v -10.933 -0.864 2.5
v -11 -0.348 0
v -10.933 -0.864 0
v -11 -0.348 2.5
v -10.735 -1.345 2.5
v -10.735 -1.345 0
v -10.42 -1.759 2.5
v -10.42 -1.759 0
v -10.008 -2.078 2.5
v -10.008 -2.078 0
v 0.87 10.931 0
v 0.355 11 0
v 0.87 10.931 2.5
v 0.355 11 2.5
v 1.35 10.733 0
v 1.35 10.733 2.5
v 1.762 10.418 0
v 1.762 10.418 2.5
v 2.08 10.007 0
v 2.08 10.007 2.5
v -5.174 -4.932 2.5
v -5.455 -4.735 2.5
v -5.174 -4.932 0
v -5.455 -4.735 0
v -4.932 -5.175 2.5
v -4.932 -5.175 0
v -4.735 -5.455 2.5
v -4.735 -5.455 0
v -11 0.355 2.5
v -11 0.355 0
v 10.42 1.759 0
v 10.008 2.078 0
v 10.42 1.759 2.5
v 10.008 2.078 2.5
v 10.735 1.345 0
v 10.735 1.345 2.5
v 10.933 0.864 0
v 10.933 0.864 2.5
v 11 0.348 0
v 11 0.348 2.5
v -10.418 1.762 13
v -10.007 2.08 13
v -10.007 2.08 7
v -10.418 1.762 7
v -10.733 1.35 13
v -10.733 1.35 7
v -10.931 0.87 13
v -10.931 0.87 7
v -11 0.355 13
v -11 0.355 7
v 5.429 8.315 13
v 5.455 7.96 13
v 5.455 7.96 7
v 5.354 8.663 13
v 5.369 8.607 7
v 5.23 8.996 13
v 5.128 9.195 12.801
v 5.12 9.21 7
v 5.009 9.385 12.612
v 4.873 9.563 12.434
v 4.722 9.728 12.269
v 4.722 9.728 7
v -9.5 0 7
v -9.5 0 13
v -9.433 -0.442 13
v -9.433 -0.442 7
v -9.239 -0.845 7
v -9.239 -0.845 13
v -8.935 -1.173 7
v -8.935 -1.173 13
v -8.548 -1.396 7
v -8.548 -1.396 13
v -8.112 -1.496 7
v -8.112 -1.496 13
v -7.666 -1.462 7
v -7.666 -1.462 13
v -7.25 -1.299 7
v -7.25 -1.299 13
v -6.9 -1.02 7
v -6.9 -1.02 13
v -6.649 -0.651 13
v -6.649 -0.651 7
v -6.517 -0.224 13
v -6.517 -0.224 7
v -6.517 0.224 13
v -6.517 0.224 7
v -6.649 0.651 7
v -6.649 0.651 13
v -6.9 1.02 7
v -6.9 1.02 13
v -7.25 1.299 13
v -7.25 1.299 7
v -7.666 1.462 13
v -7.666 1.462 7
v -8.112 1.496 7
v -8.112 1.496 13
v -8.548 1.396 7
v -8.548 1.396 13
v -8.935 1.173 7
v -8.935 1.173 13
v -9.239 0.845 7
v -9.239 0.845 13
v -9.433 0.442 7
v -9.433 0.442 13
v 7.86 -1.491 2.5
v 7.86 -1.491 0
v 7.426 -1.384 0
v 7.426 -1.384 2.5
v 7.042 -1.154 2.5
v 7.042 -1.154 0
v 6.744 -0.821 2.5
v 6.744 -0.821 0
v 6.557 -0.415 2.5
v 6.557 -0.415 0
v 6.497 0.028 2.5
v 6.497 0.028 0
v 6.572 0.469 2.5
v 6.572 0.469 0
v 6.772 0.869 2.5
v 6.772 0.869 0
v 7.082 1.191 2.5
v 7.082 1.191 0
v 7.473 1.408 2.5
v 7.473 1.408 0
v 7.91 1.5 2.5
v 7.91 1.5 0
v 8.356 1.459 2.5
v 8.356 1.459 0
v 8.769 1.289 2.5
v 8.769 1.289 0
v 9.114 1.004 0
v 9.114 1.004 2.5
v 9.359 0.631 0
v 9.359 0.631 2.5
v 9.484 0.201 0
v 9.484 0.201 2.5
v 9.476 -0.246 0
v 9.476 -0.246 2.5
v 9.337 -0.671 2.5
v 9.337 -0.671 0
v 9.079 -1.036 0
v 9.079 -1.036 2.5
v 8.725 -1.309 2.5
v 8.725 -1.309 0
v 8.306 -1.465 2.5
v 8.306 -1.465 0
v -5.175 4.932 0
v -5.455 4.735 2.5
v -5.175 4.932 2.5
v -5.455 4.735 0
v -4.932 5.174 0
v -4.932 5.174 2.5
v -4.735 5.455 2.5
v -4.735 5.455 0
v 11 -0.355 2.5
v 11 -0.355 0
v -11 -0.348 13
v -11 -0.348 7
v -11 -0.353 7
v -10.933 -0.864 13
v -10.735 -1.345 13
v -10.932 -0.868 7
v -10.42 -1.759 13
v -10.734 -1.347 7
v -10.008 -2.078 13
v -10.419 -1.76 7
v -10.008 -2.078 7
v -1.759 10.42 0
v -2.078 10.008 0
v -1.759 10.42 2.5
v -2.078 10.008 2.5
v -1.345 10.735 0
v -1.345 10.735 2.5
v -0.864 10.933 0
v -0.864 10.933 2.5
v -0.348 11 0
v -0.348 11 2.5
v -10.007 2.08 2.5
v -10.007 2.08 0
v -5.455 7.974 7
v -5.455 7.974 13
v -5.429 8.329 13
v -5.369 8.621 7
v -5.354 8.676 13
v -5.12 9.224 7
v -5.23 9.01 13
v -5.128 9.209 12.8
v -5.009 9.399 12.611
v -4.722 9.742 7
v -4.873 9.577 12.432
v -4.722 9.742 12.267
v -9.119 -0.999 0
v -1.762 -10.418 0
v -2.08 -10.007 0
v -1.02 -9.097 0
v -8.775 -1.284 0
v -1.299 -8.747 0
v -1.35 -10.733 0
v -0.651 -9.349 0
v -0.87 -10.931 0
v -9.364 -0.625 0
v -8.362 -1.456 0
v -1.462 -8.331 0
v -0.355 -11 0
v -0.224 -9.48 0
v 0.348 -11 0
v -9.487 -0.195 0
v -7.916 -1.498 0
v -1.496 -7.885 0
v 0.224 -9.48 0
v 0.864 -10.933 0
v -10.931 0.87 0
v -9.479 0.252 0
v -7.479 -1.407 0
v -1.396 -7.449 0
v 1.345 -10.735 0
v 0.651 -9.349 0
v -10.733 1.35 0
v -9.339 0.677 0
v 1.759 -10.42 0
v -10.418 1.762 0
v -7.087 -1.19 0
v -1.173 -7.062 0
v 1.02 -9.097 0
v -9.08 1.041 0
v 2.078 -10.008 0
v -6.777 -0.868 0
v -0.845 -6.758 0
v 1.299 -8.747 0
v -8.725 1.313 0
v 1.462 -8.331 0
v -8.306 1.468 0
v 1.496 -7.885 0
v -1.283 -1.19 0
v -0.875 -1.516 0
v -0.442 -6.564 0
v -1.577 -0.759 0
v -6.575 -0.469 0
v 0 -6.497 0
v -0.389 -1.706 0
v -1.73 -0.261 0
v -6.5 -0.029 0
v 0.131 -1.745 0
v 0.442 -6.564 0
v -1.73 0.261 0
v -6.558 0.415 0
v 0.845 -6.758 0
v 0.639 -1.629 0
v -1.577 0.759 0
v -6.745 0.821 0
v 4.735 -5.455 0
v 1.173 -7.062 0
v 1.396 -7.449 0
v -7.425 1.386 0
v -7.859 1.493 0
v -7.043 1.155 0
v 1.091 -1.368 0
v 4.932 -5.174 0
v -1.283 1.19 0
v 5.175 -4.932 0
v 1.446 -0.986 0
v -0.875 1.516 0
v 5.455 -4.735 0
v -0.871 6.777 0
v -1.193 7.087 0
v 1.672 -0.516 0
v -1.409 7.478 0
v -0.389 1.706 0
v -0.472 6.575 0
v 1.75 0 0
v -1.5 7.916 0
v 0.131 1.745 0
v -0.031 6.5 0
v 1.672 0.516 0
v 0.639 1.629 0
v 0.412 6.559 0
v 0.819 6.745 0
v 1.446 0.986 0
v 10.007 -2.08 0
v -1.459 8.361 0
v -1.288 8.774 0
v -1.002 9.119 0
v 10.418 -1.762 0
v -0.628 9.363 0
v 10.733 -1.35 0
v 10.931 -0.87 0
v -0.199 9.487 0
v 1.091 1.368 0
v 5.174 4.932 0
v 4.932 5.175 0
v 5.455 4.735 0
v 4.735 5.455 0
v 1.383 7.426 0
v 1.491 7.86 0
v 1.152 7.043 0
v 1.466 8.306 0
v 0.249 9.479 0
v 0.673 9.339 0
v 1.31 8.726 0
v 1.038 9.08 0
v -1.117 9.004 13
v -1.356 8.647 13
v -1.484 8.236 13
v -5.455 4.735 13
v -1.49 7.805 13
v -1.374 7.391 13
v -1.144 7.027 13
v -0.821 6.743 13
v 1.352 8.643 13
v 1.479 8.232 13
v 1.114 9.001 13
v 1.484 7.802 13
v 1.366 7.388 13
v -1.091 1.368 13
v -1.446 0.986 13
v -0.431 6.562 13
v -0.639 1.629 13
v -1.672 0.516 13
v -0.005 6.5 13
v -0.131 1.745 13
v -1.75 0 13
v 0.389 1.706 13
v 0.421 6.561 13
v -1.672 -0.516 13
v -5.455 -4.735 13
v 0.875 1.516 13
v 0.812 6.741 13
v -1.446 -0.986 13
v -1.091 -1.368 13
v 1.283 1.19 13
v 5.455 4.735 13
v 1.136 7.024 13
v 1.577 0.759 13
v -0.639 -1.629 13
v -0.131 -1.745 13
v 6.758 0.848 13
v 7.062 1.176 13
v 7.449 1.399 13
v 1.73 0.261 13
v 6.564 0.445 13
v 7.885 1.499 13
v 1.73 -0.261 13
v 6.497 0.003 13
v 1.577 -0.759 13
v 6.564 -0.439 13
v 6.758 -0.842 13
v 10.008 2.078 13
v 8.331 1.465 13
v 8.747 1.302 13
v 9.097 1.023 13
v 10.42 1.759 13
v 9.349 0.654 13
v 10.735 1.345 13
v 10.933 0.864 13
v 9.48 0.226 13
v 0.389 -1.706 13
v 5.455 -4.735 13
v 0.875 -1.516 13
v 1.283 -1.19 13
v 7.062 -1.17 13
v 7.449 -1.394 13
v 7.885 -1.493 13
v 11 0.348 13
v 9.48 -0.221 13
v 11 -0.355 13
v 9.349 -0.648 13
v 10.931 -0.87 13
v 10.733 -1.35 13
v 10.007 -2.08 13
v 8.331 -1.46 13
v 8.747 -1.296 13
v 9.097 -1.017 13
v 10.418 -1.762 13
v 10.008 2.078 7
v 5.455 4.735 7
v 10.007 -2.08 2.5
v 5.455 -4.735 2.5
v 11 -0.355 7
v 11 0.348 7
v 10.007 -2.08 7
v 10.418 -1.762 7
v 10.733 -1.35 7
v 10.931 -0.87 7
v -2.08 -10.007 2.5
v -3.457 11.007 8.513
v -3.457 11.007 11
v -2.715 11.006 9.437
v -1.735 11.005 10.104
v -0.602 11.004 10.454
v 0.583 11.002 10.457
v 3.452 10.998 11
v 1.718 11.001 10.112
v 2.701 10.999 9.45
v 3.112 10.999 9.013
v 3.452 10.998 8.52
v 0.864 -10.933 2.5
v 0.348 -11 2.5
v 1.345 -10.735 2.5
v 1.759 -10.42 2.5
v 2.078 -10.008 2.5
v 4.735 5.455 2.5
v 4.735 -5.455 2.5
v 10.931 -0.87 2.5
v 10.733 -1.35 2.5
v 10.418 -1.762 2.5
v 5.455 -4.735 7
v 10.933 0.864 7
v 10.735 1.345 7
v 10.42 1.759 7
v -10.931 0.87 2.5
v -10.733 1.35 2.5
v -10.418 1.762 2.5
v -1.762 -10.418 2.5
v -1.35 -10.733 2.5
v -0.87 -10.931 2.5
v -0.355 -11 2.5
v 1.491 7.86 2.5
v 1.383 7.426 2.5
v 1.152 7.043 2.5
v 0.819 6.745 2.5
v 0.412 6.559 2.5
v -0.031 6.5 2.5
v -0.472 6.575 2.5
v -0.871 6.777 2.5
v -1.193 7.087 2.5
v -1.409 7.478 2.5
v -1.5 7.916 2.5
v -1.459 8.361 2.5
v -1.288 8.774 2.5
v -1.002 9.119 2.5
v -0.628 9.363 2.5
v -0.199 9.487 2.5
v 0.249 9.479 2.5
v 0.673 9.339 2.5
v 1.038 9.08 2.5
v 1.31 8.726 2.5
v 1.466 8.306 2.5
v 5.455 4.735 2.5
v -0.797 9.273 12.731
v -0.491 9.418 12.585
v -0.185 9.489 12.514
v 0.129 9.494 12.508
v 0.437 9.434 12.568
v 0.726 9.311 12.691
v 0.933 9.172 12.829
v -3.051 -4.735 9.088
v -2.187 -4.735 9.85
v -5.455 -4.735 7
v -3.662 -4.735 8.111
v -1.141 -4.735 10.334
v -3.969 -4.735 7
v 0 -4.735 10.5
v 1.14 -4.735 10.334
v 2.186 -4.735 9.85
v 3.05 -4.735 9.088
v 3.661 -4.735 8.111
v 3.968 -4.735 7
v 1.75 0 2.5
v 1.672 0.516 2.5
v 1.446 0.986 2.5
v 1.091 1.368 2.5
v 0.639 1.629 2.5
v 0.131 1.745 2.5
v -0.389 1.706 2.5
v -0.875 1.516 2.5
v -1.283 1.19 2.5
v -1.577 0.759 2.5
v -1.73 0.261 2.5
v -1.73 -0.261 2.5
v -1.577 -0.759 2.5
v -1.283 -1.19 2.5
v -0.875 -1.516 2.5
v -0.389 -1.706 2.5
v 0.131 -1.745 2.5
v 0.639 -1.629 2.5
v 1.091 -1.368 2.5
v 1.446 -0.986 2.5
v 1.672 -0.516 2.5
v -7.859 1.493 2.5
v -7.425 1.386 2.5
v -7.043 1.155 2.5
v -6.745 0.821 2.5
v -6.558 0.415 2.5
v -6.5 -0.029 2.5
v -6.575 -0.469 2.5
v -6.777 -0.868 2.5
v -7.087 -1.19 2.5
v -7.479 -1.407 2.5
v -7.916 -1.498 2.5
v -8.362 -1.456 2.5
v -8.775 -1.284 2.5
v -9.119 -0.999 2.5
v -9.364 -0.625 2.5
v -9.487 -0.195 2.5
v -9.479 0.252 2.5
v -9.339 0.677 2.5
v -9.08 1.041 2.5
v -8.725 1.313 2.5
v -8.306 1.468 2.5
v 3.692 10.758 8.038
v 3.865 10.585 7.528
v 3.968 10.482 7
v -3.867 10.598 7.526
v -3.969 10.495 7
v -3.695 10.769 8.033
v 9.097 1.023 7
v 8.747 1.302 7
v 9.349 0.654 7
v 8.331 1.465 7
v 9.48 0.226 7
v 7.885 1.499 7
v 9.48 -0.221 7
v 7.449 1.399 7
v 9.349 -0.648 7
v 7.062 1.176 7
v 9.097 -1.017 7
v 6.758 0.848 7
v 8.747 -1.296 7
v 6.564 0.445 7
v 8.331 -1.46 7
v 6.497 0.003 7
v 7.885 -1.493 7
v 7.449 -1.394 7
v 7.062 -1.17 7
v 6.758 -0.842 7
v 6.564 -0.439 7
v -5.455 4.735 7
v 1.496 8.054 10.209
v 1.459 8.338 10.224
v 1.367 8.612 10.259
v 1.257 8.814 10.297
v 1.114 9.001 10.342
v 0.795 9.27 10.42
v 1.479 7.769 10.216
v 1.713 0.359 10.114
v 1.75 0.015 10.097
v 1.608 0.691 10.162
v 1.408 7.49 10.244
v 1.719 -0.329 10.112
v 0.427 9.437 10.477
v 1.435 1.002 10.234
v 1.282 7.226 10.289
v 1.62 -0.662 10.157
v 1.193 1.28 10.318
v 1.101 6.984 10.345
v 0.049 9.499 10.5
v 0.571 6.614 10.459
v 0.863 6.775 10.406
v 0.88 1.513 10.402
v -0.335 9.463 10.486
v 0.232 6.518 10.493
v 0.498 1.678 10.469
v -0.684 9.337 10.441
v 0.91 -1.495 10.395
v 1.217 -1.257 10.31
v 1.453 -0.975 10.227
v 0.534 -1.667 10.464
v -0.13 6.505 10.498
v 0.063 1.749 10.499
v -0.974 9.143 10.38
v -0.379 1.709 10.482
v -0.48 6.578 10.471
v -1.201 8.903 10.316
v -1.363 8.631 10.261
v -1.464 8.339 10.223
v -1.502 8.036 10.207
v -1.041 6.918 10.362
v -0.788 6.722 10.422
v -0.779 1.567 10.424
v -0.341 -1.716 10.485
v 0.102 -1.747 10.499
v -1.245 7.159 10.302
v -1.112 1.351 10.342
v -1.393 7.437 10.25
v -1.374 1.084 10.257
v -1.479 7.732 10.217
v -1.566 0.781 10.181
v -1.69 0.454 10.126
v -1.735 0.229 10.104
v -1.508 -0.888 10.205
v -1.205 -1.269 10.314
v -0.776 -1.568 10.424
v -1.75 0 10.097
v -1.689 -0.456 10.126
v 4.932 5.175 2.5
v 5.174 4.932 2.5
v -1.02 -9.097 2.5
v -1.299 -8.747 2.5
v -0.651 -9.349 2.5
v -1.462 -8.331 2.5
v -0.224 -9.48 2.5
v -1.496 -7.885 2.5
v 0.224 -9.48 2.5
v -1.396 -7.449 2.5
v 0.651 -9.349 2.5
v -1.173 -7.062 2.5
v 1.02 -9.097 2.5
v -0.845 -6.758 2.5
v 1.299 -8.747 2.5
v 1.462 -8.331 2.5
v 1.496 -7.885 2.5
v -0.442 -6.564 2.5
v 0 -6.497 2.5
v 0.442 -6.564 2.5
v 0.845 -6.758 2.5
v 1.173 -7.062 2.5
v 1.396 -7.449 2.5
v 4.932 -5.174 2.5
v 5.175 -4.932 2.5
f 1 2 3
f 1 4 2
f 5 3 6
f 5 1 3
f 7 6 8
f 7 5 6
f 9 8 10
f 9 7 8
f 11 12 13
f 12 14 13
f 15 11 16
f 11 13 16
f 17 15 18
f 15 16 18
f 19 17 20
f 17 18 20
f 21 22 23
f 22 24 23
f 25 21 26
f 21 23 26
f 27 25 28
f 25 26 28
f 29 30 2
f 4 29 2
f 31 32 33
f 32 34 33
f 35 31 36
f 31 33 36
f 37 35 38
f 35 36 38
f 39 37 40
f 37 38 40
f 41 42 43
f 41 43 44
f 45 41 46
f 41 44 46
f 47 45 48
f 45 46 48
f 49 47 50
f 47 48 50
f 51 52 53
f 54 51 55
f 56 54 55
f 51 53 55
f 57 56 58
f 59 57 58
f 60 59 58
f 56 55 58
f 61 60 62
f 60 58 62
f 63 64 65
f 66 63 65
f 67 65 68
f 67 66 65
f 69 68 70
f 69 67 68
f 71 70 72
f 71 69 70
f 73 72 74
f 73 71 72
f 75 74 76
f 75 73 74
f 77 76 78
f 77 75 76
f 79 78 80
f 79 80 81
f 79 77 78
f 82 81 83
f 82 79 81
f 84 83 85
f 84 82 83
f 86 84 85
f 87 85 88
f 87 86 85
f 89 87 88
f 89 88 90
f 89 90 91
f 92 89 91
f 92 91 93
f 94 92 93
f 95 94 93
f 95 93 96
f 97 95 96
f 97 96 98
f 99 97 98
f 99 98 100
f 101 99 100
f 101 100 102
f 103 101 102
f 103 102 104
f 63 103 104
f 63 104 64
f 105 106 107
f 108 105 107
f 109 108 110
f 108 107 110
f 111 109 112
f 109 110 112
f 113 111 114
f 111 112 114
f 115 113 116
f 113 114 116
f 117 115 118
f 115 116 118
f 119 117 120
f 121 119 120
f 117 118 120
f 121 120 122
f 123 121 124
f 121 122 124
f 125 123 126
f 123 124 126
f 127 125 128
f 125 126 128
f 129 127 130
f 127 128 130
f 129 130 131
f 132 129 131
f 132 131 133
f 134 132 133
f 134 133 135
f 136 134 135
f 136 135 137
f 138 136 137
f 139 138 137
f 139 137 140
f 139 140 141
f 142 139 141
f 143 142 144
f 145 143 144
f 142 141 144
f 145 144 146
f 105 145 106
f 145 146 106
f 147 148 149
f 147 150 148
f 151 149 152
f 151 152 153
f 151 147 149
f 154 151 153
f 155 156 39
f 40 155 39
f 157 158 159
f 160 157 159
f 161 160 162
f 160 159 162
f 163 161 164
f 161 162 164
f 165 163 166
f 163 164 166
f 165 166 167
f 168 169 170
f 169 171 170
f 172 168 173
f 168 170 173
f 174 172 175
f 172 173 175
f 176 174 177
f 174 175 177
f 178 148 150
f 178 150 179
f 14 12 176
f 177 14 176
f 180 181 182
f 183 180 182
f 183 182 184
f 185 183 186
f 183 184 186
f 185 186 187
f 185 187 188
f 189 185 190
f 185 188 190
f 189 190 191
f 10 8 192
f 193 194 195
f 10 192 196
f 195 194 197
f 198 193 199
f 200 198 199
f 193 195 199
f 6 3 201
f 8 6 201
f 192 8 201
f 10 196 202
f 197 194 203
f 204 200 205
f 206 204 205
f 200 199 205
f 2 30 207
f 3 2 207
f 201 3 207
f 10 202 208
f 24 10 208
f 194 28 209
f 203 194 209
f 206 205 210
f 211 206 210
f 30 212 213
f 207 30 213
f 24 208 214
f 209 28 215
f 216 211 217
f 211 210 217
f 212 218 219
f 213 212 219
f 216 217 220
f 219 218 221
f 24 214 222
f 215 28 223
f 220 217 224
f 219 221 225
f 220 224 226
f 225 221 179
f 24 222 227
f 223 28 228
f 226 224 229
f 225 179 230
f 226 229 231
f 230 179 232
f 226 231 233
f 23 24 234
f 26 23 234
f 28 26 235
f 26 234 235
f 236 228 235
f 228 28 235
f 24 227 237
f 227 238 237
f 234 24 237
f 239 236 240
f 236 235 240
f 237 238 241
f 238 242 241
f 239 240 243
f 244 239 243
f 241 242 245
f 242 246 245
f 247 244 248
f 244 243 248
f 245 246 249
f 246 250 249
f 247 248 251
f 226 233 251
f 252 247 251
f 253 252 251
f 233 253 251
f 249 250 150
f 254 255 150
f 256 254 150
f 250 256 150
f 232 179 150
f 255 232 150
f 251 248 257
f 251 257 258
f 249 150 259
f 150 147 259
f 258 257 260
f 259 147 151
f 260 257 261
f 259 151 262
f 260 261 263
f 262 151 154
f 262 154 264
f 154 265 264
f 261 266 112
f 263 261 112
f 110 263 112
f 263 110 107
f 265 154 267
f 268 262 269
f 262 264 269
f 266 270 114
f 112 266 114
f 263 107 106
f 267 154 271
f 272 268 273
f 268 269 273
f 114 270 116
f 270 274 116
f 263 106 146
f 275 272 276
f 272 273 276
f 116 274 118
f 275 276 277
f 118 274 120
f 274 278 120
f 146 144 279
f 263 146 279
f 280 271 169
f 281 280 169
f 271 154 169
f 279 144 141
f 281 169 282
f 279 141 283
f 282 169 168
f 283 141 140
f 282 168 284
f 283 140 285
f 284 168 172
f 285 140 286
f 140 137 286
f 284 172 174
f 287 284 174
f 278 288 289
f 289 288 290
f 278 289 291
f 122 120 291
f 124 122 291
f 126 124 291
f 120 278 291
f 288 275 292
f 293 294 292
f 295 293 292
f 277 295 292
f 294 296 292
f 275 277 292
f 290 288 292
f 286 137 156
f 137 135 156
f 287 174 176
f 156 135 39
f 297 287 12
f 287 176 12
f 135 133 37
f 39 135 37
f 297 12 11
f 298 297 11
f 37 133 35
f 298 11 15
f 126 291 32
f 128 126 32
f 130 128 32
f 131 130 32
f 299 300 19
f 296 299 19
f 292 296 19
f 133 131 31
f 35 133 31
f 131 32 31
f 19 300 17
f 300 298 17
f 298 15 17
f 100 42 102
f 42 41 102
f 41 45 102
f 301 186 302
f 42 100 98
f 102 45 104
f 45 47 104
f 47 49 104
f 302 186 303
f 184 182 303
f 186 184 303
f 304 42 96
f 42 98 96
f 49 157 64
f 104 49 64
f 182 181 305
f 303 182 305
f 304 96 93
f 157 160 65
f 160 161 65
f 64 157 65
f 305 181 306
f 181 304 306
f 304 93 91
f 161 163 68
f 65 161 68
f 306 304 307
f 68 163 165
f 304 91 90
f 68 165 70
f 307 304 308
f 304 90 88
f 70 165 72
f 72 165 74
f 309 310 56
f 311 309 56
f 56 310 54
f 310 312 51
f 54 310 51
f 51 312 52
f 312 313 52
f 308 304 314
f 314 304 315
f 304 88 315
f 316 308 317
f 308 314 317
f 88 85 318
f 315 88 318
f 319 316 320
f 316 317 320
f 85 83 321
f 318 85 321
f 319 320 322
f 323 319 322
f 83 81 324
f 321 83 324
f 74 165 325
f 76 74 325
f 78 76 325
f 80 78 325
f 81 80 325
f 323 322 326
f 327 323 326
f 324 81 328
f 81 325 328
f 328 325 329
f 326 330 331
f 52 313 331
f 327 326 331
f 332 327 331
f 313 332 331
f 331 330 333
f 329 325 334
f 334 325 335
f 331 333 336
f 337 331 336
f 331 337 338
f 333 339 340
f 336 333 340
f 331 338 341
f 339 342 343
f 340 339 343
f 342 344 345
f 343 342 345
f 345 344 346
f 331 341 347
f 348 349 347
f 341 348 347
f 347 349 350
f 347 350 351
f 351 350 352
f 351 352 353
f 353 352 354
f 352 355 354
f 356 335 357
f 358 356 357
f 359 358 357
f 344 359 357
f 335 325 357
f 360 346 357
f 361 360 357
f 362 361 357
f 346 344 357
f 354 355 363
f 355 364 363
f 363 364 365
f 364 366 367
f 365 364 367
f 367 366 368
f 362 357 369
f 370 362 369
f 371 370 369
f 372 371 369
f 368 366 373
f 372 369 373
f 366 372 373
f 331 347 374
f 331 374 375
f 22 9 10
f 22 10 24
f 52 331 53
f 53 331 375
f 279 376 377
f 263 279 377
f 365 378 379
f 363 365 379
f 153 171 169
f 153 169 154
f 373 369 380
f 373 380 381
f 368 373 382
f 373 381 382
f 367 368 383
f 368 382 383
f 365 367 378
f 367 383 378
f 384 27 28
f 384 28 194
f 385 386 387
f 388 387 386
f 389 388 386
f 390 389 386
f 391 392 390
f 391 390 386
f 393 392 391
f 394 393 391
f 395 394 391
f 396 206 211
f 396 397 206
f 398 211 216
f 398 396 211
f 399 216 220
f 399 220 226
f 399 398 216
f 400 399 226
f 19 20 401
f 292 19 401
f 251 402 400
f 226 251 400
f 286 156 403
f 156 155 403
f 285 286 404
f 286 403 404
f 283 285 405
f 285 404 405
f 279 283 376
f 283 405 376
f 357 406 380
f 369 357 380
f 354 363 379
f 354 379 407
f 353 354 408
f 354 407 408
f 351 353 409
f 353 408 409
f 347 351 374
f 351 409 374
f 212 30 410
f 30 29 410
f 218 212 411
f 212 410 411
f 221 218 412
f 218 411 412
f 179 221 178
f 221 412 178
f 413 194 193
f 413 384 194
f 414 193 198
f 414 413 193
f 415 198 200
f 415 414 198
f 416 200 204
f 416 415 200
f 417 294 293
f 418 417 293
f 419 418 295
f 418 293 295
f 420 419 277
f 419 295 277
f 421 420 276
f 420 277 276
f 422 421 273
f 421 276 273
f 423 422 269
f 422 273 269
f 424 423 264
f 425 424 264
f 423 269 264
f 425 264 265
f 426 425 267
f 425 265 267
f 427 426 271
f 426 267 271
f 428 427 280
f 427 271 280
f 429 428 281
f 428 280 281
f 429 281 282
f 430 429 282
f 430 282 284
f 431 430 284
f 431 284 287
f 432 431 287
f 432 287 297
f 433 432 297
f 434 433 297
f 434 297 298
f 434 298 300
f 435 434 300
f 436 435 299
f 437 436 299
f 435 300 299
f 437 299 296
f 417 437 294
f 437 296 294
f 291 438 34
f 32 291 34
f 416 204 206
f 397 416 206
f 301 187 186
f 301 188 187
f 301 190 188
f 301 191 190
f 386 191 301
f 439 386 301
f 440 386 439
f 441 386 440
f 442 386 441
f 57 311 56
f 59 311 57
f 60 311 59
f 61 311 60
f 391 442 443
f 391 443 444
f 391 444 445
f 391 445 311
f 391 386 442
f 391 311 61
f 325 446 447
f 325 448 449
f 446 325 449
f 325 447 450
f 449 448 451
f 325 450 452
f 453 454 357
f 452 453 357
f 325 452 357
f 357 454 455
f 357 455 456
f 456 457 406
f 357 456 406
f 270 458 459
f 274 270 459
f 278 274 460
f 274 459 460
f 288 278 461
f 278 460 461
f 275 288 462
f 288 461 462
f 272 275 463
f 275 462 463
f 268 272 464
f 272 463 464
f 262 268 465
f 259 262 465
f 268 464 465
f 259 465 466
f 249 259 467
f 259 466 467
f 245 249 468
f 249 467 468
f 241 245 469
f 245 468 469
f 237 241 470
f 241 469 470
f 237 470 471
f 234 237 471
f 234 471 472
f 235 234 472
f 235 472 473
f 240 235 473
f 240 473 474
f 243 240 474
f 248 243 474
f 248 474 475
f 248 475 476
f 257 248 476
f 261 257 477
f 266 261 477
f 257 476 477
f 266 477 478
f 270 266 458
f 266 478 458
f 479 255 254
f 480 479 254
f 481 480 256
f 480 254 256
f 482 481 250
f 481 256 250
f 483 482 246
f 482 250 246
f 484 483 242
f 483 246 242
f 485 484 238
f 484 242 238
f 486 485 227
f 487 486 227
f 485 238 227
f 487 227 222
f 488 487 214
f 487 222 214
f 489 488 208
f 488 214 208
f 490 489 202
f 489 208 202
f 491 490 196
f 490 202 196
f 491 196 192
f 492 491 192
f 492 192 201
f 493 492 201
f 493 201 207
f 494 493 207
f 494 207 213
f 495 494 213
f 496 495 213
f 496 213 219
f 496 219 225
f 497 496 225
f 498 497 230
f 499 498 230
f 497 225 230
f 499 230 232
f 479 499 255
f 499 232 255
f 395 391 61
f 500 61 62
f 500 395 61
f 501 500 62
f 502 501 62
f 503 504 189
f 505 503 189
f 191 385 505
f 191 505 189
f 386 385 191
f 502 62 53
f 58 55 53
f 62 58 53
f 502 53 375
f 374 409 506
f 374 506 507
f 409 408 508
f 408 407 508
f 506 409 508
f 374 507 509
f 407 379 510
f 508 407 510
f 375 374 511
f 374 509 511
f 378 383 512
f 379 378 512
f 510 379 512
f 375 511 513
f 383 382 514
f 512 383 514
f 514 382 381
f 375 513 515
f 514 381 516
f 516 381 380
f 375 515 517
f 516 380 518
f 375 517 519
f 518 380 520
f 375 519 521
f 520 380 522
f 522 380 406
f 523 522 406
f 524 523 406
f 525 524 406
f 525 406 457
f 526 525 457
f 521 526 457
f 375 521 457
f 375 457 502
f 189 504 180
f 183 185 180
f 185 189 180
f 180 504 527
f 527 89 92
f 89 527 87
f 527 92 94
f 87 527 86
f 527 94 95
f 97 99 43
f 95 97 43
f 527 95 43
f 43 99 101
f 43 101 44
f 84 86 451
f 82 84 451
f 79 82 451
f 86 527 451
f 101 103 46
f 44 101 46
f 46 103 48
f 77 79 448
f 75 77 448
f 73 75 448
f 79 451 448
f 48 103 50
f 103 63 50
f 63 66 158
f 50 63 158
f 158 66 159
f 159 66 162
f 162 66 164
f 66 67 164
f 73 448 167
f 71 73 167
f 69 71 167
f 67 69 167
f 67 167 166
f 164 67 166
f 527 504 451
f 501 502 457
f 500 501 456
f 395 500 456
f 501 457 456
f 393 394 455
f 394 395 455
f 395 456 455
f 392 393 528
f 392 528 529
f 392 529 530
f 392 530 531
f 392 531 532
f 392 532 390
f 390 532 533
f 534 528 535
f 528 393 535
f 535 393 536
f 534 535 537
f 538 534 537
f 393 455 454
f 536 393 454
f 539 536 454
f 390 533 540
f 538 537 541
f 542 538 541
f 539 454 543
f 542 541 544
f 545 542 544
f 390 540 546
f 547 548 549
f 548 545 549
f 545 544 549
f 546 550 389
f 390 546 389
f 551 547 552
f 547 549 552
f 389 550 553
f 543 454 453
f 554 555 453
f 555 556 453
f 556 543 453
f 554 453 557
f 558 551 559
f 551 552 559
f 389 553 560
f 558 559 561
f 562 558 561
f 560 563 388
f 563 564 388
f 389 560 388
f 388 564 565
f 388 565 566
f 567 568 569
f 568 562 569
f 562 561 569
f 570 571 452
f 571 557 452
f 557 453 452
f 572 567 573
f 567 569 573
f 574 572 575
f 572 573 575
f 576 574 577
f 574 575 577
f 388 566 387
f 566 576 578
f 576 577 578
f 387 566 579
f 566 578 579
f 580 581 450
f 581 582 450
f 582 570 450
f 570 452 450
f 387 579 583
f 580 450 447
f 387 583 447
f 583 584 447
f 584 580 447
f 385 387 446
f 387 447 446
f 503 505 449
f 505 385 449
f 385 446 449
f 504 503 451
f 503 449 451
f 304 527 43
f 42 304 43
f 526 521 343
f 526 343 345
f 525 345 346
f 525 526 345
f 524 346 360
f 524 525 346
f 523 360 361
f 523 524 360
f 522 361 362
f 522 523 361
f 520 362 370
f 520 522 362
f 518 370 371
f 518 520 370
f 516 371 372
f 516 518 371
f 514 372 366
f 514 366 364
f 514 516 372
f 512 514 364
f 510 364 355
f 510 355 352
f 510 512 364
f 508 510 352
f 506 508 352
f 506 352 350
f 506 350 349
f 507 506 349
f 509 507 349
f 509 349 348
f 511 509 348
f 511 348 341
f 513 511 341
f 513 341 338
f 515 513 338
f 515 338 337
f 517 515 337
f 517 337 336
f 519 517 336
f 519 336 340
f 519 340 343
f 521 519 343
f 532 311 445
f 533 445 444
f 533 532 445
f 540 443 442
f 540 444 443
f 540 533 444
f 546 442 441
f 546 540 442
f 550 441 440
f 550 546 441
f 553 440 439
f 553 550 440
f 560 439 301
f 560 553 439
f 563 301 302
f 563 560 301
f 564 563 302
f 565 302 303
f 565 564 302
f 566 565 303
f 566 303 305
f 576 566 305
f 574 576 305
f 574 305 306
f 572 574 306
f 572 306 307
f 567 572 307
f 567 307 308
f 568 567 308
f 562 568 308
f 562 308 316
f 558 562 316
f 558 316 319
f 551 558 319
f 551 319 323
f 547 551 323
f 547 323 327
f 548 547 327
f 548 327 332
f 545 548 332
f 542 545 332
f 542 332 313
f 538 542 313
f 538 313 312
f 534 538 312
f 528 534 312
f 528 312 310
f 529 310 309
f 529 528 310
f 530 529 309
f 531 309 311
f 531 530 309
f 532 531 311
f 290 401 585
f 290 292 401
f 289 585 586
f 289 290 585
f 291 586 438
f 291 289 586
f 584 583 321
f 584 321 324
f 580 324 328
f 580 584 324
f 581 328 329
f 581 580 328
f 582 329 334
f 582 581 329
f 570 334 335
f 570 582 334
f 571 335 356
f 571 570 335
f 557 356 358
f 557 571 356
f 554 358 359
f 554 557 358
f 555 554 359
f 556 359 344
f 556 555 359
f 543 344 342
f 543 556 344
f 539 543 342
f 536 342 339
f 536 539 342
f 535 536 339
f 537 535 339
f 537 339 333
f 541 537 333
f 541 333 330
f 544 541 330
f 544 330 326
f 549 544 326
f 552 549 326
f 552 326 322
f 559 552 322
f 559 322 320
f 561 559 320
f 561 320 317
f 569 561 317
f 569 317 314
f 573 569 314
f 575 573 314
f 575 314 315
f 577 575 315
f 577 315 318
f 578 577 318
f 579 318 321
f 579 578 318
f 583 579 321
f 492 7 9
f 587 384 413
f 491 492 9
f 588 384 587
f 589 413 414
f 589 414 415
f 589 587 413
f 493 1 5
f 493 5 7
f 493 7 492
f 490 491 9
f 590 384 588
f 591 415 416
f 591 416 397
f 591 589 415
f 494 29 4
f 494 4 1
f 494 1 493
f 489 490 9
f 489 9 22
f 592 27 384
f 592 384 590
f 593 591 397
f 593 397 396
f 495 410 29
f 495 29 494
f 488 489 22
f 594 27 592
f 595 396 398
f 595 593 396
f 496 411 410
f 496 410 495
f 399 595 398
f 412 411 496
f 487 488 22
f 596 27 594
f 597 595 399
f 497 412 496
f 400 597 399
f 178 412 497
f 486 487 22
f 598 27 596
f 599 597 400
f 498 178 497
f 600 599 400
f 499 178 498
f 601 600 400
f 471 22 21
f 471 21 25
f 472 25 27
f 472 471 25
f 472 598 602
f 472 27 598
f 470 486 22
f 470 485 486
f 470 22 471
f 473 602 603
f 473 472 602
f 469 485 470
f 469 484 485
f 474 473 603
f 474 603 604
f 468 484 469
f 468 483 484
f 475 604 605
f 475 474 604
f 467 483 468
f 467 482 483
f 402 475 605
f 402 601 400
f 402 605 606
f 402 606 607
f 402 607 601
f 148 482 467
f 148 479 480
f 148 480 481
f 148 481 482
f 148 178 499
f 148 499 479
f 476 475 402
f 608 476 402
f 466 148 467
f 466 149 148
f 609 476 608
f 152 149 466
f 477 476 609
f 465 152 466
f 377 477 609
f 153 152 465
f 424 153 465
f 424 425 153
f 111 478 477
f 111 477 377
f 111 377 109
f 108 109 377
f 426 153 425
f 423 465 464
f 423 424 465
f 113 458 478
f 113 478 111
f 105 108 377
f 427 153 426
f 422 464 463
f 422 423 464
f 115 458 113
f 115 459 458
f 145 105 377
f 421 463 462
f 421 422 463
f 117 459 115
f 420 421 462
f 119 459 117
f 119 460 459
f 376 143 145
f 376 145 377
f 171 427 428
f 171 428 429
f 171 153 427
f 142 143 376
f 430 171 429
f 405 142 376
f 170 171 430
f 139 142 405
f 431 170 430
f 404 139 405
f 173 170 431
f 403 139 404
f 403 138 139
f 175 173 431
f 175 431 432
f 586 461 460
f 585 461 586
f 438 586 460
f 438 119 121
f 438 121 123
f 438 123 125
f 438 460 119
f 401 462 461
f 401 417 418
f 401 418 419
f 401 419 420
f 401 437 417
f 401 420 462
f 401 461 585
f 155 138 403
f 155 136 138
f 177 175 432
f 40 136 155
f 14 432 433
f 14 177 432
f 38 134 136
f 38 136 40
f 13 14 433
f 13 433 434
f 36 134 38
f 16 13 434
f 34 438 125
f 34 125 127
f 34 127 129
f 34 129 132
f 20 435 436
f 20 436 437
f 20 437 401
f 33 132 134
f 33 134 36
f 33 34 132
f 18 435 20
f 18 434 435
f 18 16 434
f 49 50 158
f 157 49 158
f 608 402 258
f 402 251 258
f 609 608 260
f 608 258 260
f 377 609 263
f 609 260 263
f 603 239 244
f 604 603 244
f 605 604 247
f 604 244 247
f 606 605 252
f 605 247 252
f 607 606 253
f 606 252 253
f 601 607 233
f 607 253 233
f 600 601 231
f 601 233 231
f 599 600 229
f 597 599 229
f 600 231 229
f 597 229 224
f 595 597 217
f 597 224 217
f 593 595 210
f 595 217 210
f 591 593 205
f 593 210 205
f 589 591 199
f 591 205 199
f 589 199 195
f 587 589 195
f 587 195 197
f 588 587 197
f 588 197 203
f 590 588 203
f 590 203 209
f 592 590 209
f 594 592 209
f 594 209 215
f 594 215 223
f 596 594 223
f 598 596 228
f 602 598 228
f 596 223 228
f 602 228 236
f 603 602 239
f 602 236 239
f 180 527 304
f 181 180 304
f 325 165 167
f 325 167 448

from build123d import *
from OCP.BRepAlgoAPI import BRepAlgoAPI_Cut
from OCP.TopTools import TopTools_ListOfShape
from OCP.BRepFilletAPI import BRepFilletAPI_MakeChamfer

# Parameters (mm, degrees)
BOSS_EXTRUDE1_DEPTH = 2.5
CUT_EXTRUDE1_DEPTH  = 2.5
SKETCH3_R           = 1.75
CUT_EXTRUDE2_DEPTH  = 2.5
FILLET1_R           = 2
SKETCH4_R           = 1.5000000000000004
SKETCH4_R_2         = 1.5000000000000013
SKETCH4_R_3         = 1.75
BOSS_EXTRUDE2_DEPTH = 13
CUT_EXTRUDE3_DEPTH  = 10
BOSS_EXTRUDE3_REACH = 25.186
CHAMFER1_SIZE       = 2
CHAMFER2_SIZE       = 2
CHAMFER2_SIZE2      = 2.0025685654709307
CHAMFER2_SIZE2_2    = 1.9974412928420675
FILLET3_R           = 2.5
CUT_EXTRUDE4_START  = -10.500000000000002
CUT_EXTRUDE4_DEPTH  = 10.500000000000002


with BuildPart() as part:
    # Sketch1 → Boss-Extrude1 (new body)
    with BuildSketch(Plane.XY):
        with BuildLine():
            Line((-4.999999999999999, 6.24499799839824), (-4.999999999999999, 7.5000000000000195))
            Line((-5, 7.5000000000000195), (-10.998080575377891, 1.5019194246221268))
            Line((-10.998080575377891, 1.501919424622125), (-11.00195105101394, -1.498048948986069))
            Line((-11.001951051013936, -1.4980489489860662), (-4.999999999999998, -7.500000000000005))
            Line((-4.999999999999997, -7.500000000000005), (-4.999999999999997, -6.244997998398235))
            ThreePointArc((-5.00000000000014, -6.2449979983982855), (-6.854583671255731, -4.124885779479755), (-7.859375000000005, -1.4933936551944083))
            ThreePointArc((-7.859375000000005, -1.4933936551944376), (-9.5, 1.8e-16), (-7.859375000000005, 1.4933936551944376))
            ThreePointArc((-7.859375000000005, 1.49339365519441), (-6.854583671255727, 4.124885779479761), (-5.000000000000136, 6.244997998398289))
        make_face()
        with BuildLine():
            Line((1.68e-15, 9.499997383969479), (1.22e-15, 11.000018309985846))
            Line((3.55e-15, 11.000018309985846), (-1.4980489489860744, 11.00195105101394))
            Line((-1.4980489489860798, 11.00195105101394), (-5, 7.5000000000000195))
            Line((-4.999999999999999, 7.5000000000000195), (-4.999999999999999, 6.24499799839824))
            ThreePointArc((-5.000000000000136, 6.244997998398289), (-3.346805660983304, 7.266284598583385), (-1.4961457172971084, 7.858851569575132))
            ThreePointArc((-1.4961457172971453, 7.8588515695751315), (-1.111300148118322, 9.01055955860306), (4.818e-14, 9.499997383969479))
        make_face()
        with BuildLine():
            Line((1.5019194246221144, 10.998080575377891), (3.55e-15, 11.000018309985846))
            Line((1.22e-15, 11.000018309985846), (1.68e-15, 9.499997383969479))
            ThreePointArc((4.818e-14, 9.499997383969479), (1.0588487262158253, 9.059669249106534), (1.4971985566693762, 8.000000000000005))
            ThreePointArc((1.4971985566693762, 8.000000000000005), (1.4955583505456835, 7.929872059099467), (1.4906413192094436, 7.8598974839030715))
            ThreePointArc((1.4906413192093328, 7.859897483903073), (3.3442609453700096, 7.2674561387925065), (4.9999999999998535, 6.2449979983985155))
            Line((5.000000000000001, 6.244997998398569), (5.000000000000001, 7.5))
            Line((5, 7.500000000000001), (1.5019194246221128, 10.998080575377887))
        make_face()
        with BuildLine():
            Line((11.001951051013934, 1.4980489489860673), (5, 7.500000000000001))
            Line((5.000000000000001, 7.5), (5.000000000000001, 6.244997998398569))
            ThreePointArc((4.9999999999998535, 6.2449979983985155), (6.853793728502059, 4.126198192906619), (7.858802525285774, 1.4964033107962378))
            ThreePointArc((7.858802525285775, 1.4964033107964132), (9.007744437103462, 1.111312617626003), (9.497198556669378, 0.00280144333063154))
            ThreePointArc((9.497198556669378, 0.00280144333063118), (9.008132689961226, -1.1053556656324712), (7.859848985808763, -1.4908970186704535))
            ThreePointArc((7.859848985808765, -1.4908970186706159), (6.855238727849902, -4.123797034795342), (4.99999999999985, -6.244997998398518))
            Line((5.000000000000003, -6.244997998398572), (5.000000000000003, -7.4999999999999805))
            Line((5.000000000000002, -7.49999999999998), (10.998080575377884, -1.5019194246220966))
            Line((10.998080575377887, -1.5019194246220966), (11.001951051013936, 1.498048948986062))
        make_face()
        with BuildLine():
            ThreePointArc((-1.493650300889642, -7.859326229305683), (-3.3456520241707244, -7.266815845551774), (-5.00000000000014, -6.2449979983982855))
            Line((-4.999999999999997, -6.244997998398235), (-4.999999999999997, -7.500000000000005))
            Line((-4.999999999999998, -7.500000000000005), (-1.501919424622118, -10.998080575377886))
            Line((-1.5019194246221126, -10.998080575377887), (8.88e-15, -11.000018309985842))
            Line((8.01e-15, -11.000018309985842), (7.55e-15, -9.497198556669376))
            ThreePointArc((5.28e-15, -9.497198556669375), (-1.10833399547373, -9.007938757946256), (-1.4936503008895057, -7.859326229305681))
        make_face()
        with BuildLine():
            Line((5.000000000000003, -7.4999999999999805), (5.000000000000003, -6.244997998398572))
            ThreePointArc((4.99999999999985, -6.244997998398518), (3.345652024170554, -7.266815845551852), (1.4936503008896462, -7.859326229305682))
            ThreePointArc((1.4936503008895117, -7.859326229305681), (1.4984117343597991, -7.928189322991056), (1.5000000000000033, -7.997198556669375))
            ThreePointArc((1.5000000000000033, -7.997198556669375), (1.0606601717798252, -9.057858728449196), (5.28e-15, -9.497198556669375))
            Line((7.55e-15, -9.497198556669376), (8.01e-15, -11.000018309985842))
            Line((8.88e-15, -11.000018309985842), (1.4980489489860478, -11.001951051013936))
            Line((1.498048948986046, -11.001951051013936), (5.000000000000002, -7.49999999999998))
        make_face()
        with BuildLine():
            ThreePointArc((4.948e-14, 6.500002616030531), (-1.0112889752948502, 6.88961587823281), (-1.4961457172971453, 7.8588515695751315))
            ThreePointArc((-1.4961457172971084, 7.858851569575132), (-3.346805660983304, 7.266284598583385), (-5.000000000000136, 6.244997998398289))
            Line((-4.999999999999999, 6.24499799839824), (-4.999999999999997, -6.244997998398235))
            ThreePointArc((-5.00000000000014, -6.2449979983982855), (-3.3456520241707244, -7.266815845551774), (-1.493650300889642, -7.859326229305683))
            ThreePointArc((-1.4936503008895057, -7.859326229305681), (-1.0107402012768776, -6.88886456119564), (4.65e-15, -6.497198556669375))
            Line((6.62e-15, -6.497198556669376), (2.61e-15, 6.500002616030532))
        make_face()
        with BuildLine():
            Line((-4.999999999999997, -6.244997998398235), (-4.999999999999999, 6.24499799839824))
            ThreePointArc((-5.000000000000136, 6.244997998398289), (-6.854583671255727, 4.124885779479761), (-7.859375000000005, 1.49339365519441))
            ThreePointArc((-7.859375000000005, 1.4933936551944376), (-6.890735040668823, 1.0097184013377218), (-6.5, 0))
            ThreePointArc((-6.5, -3.7e-16), (-6.890735040668824, -1.0097184013377225), (-7.859375000000005, -1.4933936551944376))
            ThreePointArc((-7.859375000000005, -1.4933936551944083), (-6.854583671255731, -4.124885779479755), (-5.00000000000014, -6.2449979983982855))
        make_face()
        with BuildLine():
            Line((5.000000000000003, -6.244997998398572), (5.000000000000001, 6.244997998398569))
            ThreePointArc((4.9999999999998535, 6.2449979983985155), (3.3442609453700096, 7.2674561387925065), (1.4906413192093328, 7.859897483903073))
            ThreePointArc((1.4906413192094436, 7.8598974839030715), (1.0081462278259794, 6.891855241323125), (4.948e-14, 6.500002616030531))
            Line((2.61e-15, 6.500002616030532), (6.62e-15, -6.497198556669376))
            ThreePointArc((4.65e-15, -6.497198556669375), (1.010740201276885, -6.888864561195641), (1.4936503008895117, -7.859326229305681))
            ThreePointArc((1.4936503008896462, -7.859326229305682), (3.345652024170554, -7.266815845551852), (4.99999999999985, -6.244997998398518))
        make_face()
        with BuildLine():
            ThreePointArc((7.858802525285774, 1.4964033107962378), (6.853793728502059, 4.126198192906619), (4.9999999999998535, 6.2449979983985155))
            Line((5.000000000000001, 6.244997998398569), (5.000000000000003, -6.244997998398572))
            ThreePointArc((4.99999999999985, -6.244997998398518), (6.855238727849902, -4.123797034795342), (7.859848985808765, -1.4908970186706159))
            ThreePointArc((7.859848985808763, -1.4908970186704535), (6.497198648703558, 0.0022759887344901), (7.858802525285775, 1.4964033107964132))
        make_face()
    extrude(amount=BOSS_EXTRUDE1_DEPTH)

    # Sketch2 → Cut-Extrude1 (cut)
    with BuildSketch(Plane.XY.offset(2.5)):
        Polygon((-4.999999999999992, 4.999999999999999), (-10.998080575377891, 1.5019194246221257), (-1.4980489489860764, 11.001951051013943), align=None)
        Polygon((-4.999999999999992, -5.000000000000001), (-1.5019194246221135, -10.998080575377887), (-11.001951051013943, -1.498048948986061), align=None)
        Polygon((1.5019194246221084, 10.998080575377891), (4.999999999999994, 4.999999999999999), (11.00195105101394, 1.4980489489860627), align=None)
        Polygon((10.99808057537789, -1.5019194246220935), (4.9999999999999805, -4.999999999999987), (1.4980489489860442, -11.00195105101394), align=None)
    extrude(amount=-CUT_EXTRUDE1_DEPTH, mode=Mode.SUBTRACT)

    # Sketch3 → Cut-Extrude2 (cut)
    with BuildSketch(Plane.XY.offset(2.5)):
        Circle(SKETCH3_R)
    extrude(amount=-CUT_EXTRUDE2_DEPTH, mode=Mode.SUBTRACT)

    # Fillet1
    fillet1_edges = [part.edges().sort_by_distance(p)[0] for p in [
        (1.498048948986047, -11.001951051013936, 1.25),
        (-1.5019194246221153, -10.998080575377887, 1.25),
        (-11.001951051013938, -1.4980489489860678, 1.25),
        (-10.998080575377891, 1.501919424622126, 1.25),
        (-1.498048948986077, 11.00195105101394, 1.25),
        (1.5019194246221135, 10.99808057537789, 1.25),
        (11.001951051013936, 1.4980489489860647, 1.25),
        (10.998080575377886, -1.5019194246220966, 1.25),
        (-4.999999999999992, -5.000000000000001, 1.25),
        (4.999999999999994, 4.999999999999999, 1.25),
        (4.9999999999999805, -4.999999999999987, 1.25),
        (-4.999999999999992, 4.999999999999999, 1.25),
    ]]
    fillet(fillet1_edges, radius=FILLET1_R)


with BuildPart() as body_2:
    # Sketch4 → Boss-Extrude2 (new body)
    with BuildSketch(Plane.XY):
        with BuildLine():
            Line((10.999560605079953, -0.35476266258465405), (11.000466938049293, 0.3477272894640323))
            ThreePointArc((11.000466938049293, 0.3477272894640323), (10.735445401790967, 1.3452224552196366), (10.008385221504662, 2.077763590329856))
            Line((10.008385221504662, 2.077763590329856), (5.454592230537567, 4.7347596263310265))
            Line((5.454592230537567, 4.7347596263310265), (-5.454645413114042, 4.734850796298495))
            Line((-5.454645413114042, 4.734850796298495), (-10.007132441559365, 2.0798403735915616))
            ThreePointArc((-10.007132441559365, 2.0798403735915616), (-10.733154020560564, 1.3495085664980957), (-10.999560605079957, 0.35476266258468264))
            Line((-10.999560605079957, 0.35476266258468264), (-11.000466938049296, -0.3477272894640293))
            ThreePointArc((-11.000466938049296, -0.3477272894640293), (-10.735445401790972, -1.3452224552196315), (-10.00838522150467, -2.0777635903298513))
            Line((-10.00838522150467, -2.0777635903298513), (-5.4545922305375685, -4.734759626331021))
            Line((-5.4545922305375685, -4.734759626331021), (5.454645413114027, -4.734850796298485))
            Line((5.454645413114027, -4.734850796298485), (10.007132441559367, -2.0798403735915305))
            ThreePointArc((10.007132441559367, -2.0798403735915305), (10.733154020560562, -1.3495085664980646), (10.999560605079953, -0.35476266258465405))
        make_face()
        with Locations(Location((-8, 0, 0), (0, 0, 180))):
            Circle(SKETCH4_R, mode=Mode.SUBTRACT)
        with Locations(Location((7.997198556669378, 0.00280144333063154, 0), (0, 0, 180))):
            Circle(SKETCH4_R_2, mode=Mode.SUBTRACT)
        with Locations(Location((0, 0, 0), (0, 0, 180))):
            Circle(SKETCH4_R_3, mode=Mode.SUBTRACT)
    extrude(amount=BOSS_EXTRUDE2_DEPTH)


with BuildPart() as cut_extrude3_tool:
    # Sketch5 → Cut-Extrude3 (new body)
    with BuildSketch(Plane(origin=(-3.956940449073e-05, -4.7348052107618415, 0), x_dir=(0.9999999999650793, -8.35713460807451e-06, 0), z_dir=(-8.35713460807451e-06, -0.9999999999650793, 0))):
        with BuildLine():
            ThreePointArc((3.968176735513784, 6.999999999999911), (-0.00045023108312392, 10.5), (-3.969077197680013, 6.99999999999989))
            Line((-3.9690771976800265, 7.000000000000001), (3.9681767355137936, 7.000000000000001))
        make_face()
        with BuildLine():
            Line((-5.4545526613235555, 6.000000000000002), (-5.4545526613235555, 0))
            Line((-5.4545526613235555, 0), (5.454684982708999, 0))
            Line((5.454684982709, 0), (5.454684982709, 6.000000000000002))
            Line((5.454684982709001, 6.000000000000002), (3.9681767355137936, 6.000000000000002))
            ThreePointArc((3.968176735513784, 6.000000000000091), (-0.0004502310831249, 2.5), (-3.9690771976800137, 6.000000000000113))
            Line((-3.9690771976800274, 6.000000000000002), (-5.4545526613235555, 6.000000000000002))
        make_face()
        Polygon((-10.00836785700516, 0), (-5.4545526613235555, 0), (-5.4545526613235555, 6.000000000000002), (-11.000464031661387, 6.000000000000002), (-11.000464031661387, 0), align=None)
        Polygon((5.454684982709, 6.000000000000002), (5.454684982709, 0), (10.007149822715876, 0), (10.999563569495164, 0), (10.999563569495164, 6.000000000000002), align=None)
        Polygon((5.454684982709, 7.000000000000001), (5.454684982709, 6.499999999999999), (10.999563569495166, 6.499999999999998), (10.999563569495164, 7.000000000000001), align=None)
        Polygon((5.454684982709, 6.499999999999999), (5.454684982709, 6.000000000000002), (10.999563569495166, 6.000000000000002), (10.999563569495164, 6.499999999999998), align=None)
        with BuildLine():
            Line((3.9995497689168857, 6.499999999999999), (5.454684982709001, 6.499999999999999))
            Line((5.454684982709, 6.499999999999999), (5.454684982709, 7.000000000000001))
            Line((5.454684982709001, 7.000000000000001), (3.9681767355137936, 7.000000000000001))
            ThreePointArc((3.968176735513784, 6.999999999999911), (3.9916988058635026, 6.750491650172627), (3.9995497689168866, 6.5))
        make_face()
        with BuildLine():
            Line((3.9681767355137936, 6.000000000000002), (5.454684982709001, 6.000000000000002))
            Line((5.454684982709, 6.000000000000002), (5.454684982709, 6.499999999999999))
            Line((5.454684982709001, 6.499999999999999), (3.9995497689168857, 6.499999999999999))
            ThreePointArc((3.9995497689168866, 6.499999999999999), (3.9916988058635026, 6.249508349827371), (3.968176735513784, 6.000000000000091))
        make_face()
        with BuildLine():
            ThreePointArc((-3.969077197680013, 6.99999999999989), (-3.99259926802973, 6.750491650172617), (-4.000450231083113, 6.500000000000001))
            Line((-4.000450231083113, 6.500000000000001), (3.9995497689168857, 6.499999999999999))
            ThreePointArc((3.9995497689168866, 6.5), (3.9916988058635026, 6.750491650172627), (3.968176735513784, 6.999999999999911))
            Line((3.9681767355137936, 7.000000000000001), (-3.9690771976800265, 7.000000000000001))
        make_face()
        with BuildLine():
            ThreePointArc((-4.000450231083113, 6.500000000000001), (-3.99259926802973, 6.249508349827385), (-3.9690771976800137, 6.000000000000113))
            Line((-3.9690771976800274, 6.000000000000002), (3.9681767355137936, 6.000000000000002))
            ThreePointArc((3.968176735513784, 6.000000000000091), (3.9916988058635026, 6.249508349827371), (3.9995497689168866, 6.499999999999999))
            Line((3.9995497689168857, 6.499999999999999), (-4.000450231083113, 6.500000000000001))
        make_face()
        with BuildLine():
            Line((-5.4545526613235555, 7.000000000000001), (-5.4545526613235555, 6.500000000000001))
            Line((-5.4545526613235555, 6.500000000000001), (-4.000450231083113, 6.500000000000001))
            ThreePointArc((-4.000450231083113, 6.500000000000001), (-3.99259926802973, 6.750491650172617), (-3.969077197680013, 6.99999999999989))
            Line((-3.9690771976800265, 7.000000000000001), (-5.4545526613235555, 7.000000000000001))
        make_face()
        with BuildLine():
            Line((-5.4545526613235555, 6.500000000000001), (-5.4545526613235555, 6.000000000000002))
            Line((-5.4545526613235555, 6.000000000000002), (-3.9690771976800274, 6.000000000000002))
            ThreePointArc((-3.9690771976800137, 6.000000000000113), (-3.99259926802973, 6.249508349827385), (-4.000450231083113, 6.500000000000001))
            Line((-4.000450231083113, 6.500000000000001), (-5.4545526613235555, 6.500000000000001))
        make_face()
        Polygon((-11.000464031661387, 6.000000000000002), (-5.4545526613235555, 6.000000000000002), (-5.4545526613235555, 6.500000000000001), (-11.000464031661387, 6.500000000000002), align=None)
        Polygon((-11.000464031661387, 6.500000000000002), (-5.4545526613235555, 6.500000000000001), (-5.4545526613235555, 7.000000000000001), (-11.000464031661387, 7.000000000000001), align=None)
        with BuildLine():
            Line((3.9681767355137936, 6.000000000000002), (-3.9690771976800274, 6.000000000000002))
            ThreePointArc((-3.9690771976800137, 6.000000000000113), (-0.0004502310831249, 2.5), (3.968176735513784, 6.000000000000091))
        make_face()
        Polygon((5.454684982708999, 0), (-5.4545526613235555, 0), (-10.00836785700516, 0), (-11.000464031661387, 0), (-11.000464031661387, -0.1540392839917084), (11.47537378277417, -0.15403928399170852), (11.475373782774168, 7.000000000000001), (11.000464031661384, 7.000000000000001), (11.000464031661384, 0), (10.999563569495164, 0), (10.007149822715876, 0), align=None)
        Polygon((10.999563569495164, 6.499999999999998), (10.999563569495164, 6.000000000000002), (10.999563569495164, 0), (11.000464031661384, 0), (11.000464031661384, 7.000000000000001), (10.999563569495166, 7.000000000000001), align=None)
    extrude(amount=-CUT_EXTRUDE3_DEPTH)


with BuildPart() as body_2_1:
    add(body_2.part)

    # Cut-Extrude3: cut by cut_extrude3_tool, with a tolerance
    cut_extrude3_stock = TopTools_ListOfShape()
    cut_extrude3_stock.Append(body_2_1.part.wrapped)
    cut_extrude3_tools = TopTools_ListOfShape()
    cut_extrude3_tools.Append(cut_extrude3_tool.part.wrapped)
    cut_extrude3_cut = BRepAlgoAPI_Cut()
    cut_extrude3_cut.SetArguments(cut_extrude3_stock)
    cut_extrude3_cut.SetTools(cut_extrude3_tools)
    cut_extrude3_cut.SetFuzzyValue(0.00001)
    cut_extrude3_cut.Build()
    add(Compound.cast(cut_extrude3_cut.Shape()).solids(), mode=Mode.REPLACE)

    # Boss-Extrude3: up to this plane
    boss_extrude3_end = Plane(origin=(0.0141918936116578, 11.002801443330645, 15.5), z_dir=(0.0012901710727390775, 0.9999991677289553, 0))
    # Sketch6 → Boss-Extrude3 (add, up to the surface)
    with BuildSketch(Plane(origin=(3.956940449337e-05, 4.734805210761849, 0), x_dir=(0.9999999999650793, -8.357134608631048e-06, 0), z_dir=(8.357134608631048e-06, 0.9999999999650793, 0)), mode=Mode.PRIVATE) as boss_extrude3_sk1:
        with BuildLine():
            Line((-3.969077197680004, -6.999999999999999), (-5.454684982709018, -7))
            Line((-5.454684982709018, -7), (-5.454684982709018, -13))
            Line((-5.454684982709018, -13), (5.454552661323551, -13))
            Line((5.454552661323551, -13), (5.454552661323551, -7))
            Line((5.454552661323551, -7), (3.968176735513771, -7.000000000000001))
            ThreePointArc((3.968176735513771, -7.000000000000001), (-0.00045023108311679, -10.500000000000002), (-3.969077197680004, -6.999999999999999))
        make_face()
    boss_extrude3_tool1 = split(extrude(boss_extrude3_sk1.sketch, amount=BOSS_EXTRUDE3_REACH, mode=Mode.PRIVATE), bisect_by=boss_extrude3_end, keep=Keep.BOTH, mode=Mode.PRIVATE)
    add(boss_extrude3_tool1.solids().sort_by_distance((0.000157, 4.734805, 10.729608))[0])

    # Chamfer1
    chamfer1_edges = [body_2_1.edges().sort_by_distance(p)[0] for p in [
        (2.579135274328e-05, 11.002819720041206, 13),
    ]]
    chamfer(chamfer1_edges, length=CHAMFER1_SIZE)

    # Chamfer2: one chamfer whose edges measure the first distance from different faces: ONE call of the kernel's chamfer builder (chamfer() names one face for all edges)
    chamfer2_edges_1 = [body_2_1.edges().sort_by_distance(p)[0] for p in [
        (5.4546445547470315, 10.995782322842832, 9),
    ]]
    chamfer2_side_1 = [body_2_1.faces().sort_by_distance(p)[0] for p in [
        (5.4546172347602715, 7.726720851550559, 9.868788931910801),
    ]]
    chamfer2_edges_2 = [body_2_1.edges().sort_by_distance(p)[0] for p in [
        (-5.454592972041547, 11.009857117239576, 9),
    ]]
    chamfer2_side_2 = [body_2_1.faces().sort_by_distance(p)[0] for p in [
        (-5.454620351012832, 7.733737661609113, 9.869097734900382),
    ]]
    chamfer2 = BRepFilletAPI_MakeChamfer(body_2_1.part.solid().wrapped)
    for e in chamfer2_edges_1:
        chamfer2.Add(CHAMFER2_SIZE, CHAMFER2_SIZE2, e.wrapped, chamfer2_side_1[0].wrapped)  # the first distance lies on this face
    for e in chamfer2_edges_2:
        chamfer2.Add(CHAMFER2_SIZE, CHAMFER2_SIZE2_2, e.wrapped, chamfer2_side_2[0].wrapped)  # the first distance lies on this face
    add(Compound.cast(chamfer2.Shape()), mode=Mode.REPLACE)

    # Fillet3
    fillet3_edges = [body_2_1.edges().sort_by_distance(p)[0] for p in [
        (5.454627840477814, 8.995782322912673, 9.99999917847617),
        (-5.454609686310764, 9.009857117309418, 9.999999178476168),
    ]]
    fillet(fillet3_edges, radius=FILLET3_R)

    # Sketch8 → Cut-Extrude4 (cut)
    with BuildSketch(Plane.XY.offset(13).offset(CUT_EXTRUDE4_START)):
        with BuildLine():
            ThreePointArc((1.4971985566693886, 8.000000000000023), (1.398126121533543, 8.536098832309692), (1.1139959459976678, 9.001380842232159))
            Line((1.1139959459976643, 9.001380842232146), (-1.1170112117076005, 9.004259225525686))
            ThreePointArc((-1.1170112117075874, 9.00425922552565), (-0.540707265679908, 6.5997652602928785), (1.4971985566693886, 8.000000000000023))
        make_face()
        with BuildLine():
            Line((-1.1170112117076005, 9.004259225525686), (1.1139959459976643, 9.001380842232146))
            ThreePointArc((1.1139959459976678, 9.001380842232159), (-0.00086618672153648, 9.499998751593457), (-1.1170112117075874, 9.00425922552565))
        make_face()
    extrude(amount=CUT_EXTRUDE4_DEPTH, mode=Mode.SUBTRACT)


solid = Compound([part.part, body_2_1.part])
